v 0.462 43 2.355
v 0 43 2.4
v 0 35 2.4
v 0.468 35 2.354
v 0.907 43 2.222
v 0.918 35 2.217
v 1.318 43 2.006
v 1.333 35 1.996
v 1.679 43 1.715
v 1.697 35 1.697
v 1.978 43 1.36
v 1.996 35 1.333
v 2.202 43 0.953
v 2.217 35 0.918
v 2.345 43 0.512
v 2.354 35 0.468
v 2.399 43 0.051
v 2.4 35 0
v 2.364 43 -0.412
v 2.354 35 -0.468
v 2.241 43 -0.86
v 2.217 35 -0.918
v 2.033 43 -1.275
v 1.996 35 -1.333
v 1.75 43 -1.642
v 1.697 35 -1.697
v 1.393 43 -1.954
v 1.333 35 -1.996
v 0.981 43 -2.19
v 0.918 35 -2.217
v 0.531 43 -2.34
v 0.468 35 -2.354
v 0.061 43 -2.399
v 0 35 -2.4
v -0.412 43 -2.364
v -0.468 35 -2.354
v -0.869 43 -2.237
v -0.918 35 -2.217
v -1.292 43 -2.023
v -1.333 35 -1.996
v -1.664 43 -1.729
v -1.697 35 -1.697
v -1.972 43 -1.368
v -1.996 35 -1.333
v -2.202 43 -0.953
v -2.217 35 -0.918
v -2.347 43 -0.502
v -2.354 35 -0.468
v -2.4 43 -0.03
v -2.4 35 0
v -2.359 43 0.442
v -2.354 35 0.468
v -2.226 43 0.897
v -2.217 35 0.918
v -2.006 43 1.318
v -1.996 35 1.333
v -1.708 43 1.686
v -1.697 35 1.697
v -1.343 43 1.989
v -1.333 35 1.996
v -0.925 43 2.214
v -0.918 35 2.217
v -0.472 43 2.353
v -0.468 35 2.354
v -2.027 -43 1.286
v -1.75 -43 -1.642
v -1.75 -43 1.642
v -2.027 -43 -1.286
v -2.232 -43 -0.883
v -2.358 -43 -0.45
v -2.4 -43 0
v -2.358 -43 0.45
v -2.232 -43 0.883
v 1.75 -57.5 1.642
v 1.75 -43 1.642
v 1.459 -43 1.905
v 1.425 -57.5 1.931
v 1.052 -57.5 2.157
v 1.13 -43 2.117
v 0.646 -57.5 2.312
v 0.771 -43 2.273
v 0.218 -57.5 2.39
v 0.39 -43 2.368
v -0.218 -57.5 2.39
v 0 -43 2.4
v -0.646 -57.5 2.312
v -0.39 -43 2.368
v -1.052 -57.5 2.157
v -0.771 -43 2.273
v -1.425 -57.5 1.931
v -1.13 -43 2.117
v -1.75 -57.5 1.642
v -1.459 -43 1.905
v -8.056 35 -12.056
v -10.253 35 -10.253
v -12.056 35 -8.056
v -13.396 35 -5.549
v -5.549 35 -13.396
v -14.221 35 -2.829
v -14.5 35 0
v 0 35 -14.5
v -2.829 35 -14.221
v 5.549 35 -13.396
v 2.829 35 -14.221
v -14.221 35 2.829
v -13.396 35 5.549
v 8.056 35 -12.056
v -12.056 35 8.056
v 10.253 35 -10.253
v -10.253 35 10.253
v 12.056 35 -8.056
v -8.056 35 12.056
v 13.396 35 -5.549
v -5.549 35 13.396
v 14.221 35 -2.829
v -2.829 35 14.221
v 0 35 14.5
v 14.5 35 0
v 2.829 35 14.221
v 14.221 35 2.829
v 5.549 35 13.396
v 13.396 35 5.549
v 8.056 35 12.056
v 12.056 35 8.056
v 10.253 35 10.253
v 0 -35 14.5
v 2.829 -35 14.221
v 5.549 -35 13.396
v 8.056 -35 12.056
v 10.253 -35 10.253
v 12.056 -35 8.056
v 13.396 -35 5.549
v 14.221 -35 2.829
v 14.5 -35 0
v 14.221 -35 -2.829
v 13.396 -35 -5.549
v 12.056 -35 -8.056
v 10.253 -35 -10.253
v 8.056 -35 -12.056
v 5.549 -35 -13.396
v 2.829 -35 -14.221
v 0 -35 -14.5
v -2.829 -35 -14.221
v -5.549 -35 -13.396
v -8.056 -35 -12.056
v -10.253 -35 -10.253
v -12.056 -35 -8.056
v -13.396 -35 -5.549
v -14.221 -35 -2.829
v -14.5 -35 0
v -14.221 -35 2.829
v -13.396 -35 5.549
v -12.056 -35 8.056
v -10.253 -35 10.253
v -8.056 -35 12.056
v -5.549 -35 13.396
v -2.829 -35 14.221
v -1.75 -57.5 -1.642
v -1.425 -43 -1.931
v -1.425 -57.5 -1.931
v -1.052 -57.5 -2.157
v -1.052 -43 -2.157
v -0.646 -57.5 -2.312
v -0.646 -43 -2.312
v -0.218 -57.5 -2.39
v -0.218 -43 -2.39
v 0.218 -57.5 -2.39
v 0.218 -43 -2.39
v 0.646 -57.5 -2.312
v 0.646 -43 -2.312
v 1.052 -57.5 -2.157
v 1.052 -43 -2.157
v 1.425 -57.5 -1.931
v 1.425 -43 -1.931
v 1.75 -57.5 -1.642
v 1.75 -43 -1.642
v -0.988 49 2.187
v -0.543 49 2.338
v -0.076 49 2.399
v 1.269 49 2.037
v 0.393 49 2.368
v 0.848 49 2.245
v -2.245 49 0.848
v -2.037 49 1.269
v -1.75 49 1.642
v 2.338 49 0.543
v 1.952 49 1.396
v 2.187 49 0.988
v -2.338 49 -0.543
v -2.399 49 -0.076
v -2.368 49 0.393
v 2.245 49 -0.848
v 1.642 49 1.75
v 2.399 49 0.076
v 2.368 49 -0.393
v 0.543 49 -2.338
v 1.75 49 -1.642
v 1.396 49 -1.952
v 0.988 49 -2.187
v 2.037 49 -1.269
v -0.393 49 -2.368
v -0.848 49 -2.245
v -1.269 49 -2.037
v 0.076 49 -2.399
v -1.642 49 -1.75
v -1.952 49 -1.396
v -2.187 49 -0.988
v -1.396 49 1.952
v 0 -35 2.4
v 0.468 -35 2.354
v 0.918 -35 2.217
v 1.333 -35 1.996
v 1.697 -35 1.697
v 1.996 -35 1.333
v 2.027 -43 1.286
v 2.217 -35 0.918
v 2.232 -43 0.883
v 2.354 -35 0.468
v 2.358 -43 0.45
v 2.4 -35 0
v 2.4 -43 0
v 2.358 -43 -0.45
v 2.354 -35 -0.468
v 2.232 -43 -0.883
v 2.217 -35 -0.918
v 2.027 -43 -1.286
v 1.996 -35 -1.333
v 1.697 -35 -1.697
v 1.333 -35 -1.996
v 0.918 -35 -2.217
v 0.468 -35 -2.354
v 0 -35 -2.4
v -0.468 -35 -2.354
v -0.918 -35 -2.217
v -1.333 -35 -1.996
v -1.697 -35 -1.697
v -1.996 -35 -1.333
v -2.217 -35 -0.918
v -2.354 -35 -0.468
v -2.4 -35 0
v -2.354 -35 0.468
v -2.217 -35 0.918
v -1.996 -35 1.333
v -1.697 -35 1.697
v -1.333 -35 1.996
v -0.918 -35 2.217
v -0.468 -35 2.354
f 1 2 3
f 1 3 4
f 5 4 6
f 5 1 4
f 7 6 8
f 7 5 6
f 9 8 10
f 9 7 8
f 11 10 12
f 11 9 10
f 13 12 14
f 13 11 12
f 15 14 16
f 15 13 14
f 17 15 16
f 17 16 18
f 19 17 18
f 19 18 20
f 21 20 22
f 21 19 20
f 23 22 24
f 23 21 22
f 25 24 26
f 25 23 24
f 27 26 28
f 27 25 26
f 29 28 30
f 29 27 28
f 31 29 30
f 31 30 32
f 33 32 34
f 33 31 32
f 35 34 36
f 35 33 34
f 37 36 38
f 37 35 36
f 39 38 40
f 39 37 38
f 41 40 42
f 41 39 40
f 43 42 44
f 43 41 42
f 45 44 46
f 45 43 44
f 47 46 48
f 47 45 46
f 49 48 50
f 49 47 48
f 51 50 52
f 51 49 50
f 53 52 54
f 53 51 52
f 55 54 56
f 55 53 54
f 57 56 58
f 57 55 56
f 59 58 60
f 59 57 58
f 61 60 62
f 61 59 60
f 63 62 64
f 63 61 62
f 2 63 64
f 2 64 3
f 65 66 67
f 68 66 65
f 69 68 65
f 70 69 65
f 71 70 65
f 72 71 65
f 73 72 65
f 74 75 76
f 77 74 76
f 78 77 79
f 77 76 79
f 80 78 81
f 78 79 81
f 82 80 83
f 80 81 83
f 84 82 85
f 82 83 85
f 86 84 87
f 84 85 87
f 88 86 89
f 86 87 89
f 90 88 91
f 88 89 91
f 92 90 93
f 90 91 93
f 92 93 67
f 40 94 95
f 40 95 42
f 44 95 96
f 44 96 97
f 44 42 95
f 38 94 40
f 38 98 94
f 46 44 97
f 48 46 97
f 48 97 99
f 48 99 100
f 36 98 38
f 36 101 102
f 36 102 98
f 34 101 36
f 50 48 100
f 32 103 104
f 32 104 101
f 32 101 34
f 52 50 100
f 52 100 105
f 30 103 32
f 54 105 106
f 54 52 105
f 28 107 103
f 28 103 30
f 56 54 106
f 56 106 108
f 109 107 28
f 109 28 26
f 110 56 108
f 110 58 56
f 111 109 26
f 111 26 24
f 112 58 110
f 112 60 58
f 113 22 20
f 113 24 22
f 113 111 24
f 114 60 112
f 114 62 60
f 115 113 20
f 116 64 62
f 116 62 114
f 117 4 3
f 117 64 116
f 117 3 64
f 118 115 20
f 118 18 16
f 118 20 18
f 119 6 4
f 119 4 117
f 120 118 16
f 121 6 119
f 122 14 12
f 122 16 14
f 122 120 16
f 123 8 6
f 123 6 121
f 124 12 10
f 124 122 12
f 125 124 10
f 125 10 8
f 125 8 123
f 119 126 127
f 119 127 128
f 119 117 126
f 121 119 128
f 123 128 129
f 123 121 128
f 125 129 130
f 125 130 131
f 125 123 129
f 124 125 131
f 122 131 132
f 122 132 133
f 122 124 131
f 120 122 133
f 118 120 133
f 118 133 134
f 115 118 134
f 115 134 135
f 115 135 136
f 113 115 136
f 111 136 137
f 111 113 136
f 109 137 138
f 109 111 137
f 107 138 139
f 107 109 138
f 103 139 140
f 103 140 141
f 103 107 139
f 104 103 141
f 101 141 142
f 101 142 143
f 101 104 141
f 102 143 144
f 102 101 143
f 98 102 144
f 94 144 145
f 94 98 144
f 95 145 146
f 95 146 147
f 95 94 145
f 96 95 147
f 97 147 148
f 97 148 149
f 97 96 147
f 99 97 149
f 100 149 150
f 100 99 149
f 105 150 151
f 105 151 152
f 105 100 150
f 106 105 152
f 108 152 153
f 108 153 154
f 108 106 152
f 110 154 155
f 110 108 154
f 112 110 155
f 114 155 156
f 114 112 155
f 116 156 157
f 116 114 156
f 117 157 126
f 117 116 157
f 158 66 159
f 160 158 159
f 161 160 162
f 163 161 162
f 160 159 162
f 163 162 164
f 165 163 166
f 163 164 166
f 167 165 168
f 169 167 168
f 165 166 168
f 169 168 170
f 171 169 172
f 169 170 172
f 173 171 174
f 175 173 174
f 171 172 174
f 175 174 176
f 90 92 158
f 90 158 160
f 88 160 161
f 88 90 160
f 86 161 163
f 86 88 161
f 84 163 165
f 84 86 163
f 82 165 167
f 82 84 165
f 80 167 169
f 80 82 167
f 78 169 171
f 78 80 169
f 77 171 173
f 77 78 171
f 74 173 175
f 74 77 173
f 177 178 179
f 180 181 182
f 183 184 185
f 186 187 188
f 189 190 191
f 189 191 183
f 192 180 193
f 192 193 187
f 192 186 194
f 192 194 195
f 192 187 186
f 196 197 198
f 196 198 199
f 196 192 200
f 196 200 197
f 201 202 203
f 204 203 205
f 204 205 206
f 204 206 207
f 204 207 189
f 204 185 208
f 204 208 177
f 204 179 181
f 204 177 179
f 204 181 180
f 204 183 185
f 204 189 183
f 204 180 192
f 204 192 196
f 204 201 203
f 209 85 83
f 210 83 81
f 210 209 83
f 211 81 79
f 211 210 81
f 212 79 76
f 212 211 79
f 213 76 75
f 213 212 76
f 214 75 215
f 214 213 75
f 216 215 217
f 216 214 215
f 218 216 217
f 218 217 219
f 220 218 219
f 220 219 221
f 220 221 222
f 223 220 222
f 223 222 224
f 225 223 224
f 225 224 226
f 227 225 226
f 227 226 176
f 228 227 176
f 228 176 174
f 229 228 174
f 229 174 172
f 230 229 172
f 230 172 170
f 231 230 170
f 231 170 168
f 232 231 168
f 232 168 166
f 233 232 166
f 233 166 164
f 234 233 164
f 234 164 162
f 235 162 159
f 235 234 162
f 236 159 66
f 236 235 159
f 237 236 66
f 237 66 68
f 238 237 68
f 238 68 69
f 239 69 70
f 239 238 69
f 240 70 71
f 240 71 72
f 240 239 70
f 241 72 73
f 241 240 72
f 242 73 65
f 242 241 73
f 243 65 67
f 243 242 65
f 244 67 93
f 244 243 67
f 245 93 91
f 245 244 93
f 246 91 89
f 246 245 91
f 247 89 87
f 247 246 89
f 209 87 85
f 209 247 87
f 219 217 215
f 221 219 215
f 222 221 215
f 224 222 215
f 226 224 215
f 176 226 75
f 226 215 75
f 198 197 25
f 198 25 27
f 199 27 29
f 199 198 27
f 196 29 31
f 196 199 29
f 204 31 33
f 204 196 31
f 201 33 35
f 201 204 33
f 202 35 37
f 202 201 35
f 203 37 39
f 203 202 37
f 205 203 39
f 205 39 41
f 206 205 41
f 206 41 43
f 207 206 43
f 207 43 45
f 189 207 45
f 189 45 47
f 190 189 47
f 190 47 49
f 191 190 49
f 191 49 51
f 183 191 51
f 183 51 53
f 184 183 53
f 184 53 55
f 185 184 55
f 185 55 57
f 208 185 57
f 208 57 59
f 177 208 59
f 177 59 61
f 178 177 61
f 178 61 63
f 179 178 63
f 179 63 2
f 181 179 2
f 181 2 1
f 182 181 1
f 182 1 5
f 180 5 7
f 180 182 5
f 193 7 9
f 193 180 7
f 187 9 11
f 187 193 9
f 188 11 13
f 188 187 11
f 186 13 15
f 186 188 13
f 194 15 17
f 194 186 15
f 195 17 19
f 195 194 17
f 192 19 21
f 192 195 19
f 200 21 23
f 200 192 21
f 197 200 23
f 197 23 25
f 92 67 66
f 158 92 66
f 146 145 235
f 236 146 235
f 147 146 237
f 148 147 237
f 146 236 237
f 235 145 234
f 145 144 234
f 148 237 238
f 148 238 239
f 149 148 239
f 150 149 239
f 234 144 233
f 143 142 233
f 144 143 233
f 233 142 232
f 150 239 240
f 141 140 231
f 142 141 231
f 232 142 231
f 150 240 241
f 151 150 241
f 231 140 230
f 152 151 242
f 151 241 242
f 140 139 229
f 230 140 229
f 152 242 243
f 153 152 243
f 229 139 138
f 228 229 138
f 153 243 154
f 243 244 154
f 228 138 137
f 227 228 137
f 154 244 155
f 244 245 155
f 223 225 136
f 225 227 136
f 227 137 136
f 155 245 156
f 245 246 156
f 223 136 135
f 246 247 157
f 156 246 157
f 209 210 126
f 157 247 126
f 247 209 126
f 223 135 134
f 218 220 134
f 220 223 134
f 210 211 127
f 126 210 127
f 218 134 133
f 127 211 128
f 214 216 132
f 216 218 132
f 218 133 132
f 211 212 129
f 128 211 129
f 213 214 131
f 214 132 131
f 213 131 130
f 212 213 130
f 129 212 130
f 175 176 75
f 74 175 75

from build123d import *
from build123d.topology import SkipClean

# Parameters (mm, degrees)
CROQUIS1_R              = 14.5
SALIENTE_EXTRUIR1_DEPTH = 35
CROQUIS2_R              = 2.4
SALIENTE_EXTRUIR2_DEPTH = 43
SALIENTE_EXTRUIR3_DEPTH = 14.5
SALIENTE_EXTRUIR4_START = 6
CROQUIS4_R              = 2.4
SALIENTE_EXTRUIR4_DEPTH = 6


with BuildPart() as part:
    # Croquis1 → Saliente-Extruir1 (new, symmetric)
    with BuildSketch(Plane(origin=(0, 0, 0), x_dir=(1, 0, 0), z_dir=(0, 1, 0))):
        with Locations(Location((0, 0, 0), (0, 0, 270))):
            Circle(CROQUIS1_R)
    extrude(amount=SALIENTE_EXTRUIR1_DEPTH, both=True)

    # Croquis2 → Saliente-Extruir2 (add, symmetric)
    with BuildSketch(Plane(origin=(0, 0, 0), x_dir=(1, 0, 0), z_dir=(0, 1, 0))):
        with Locations(Location((0, 0, 0), (0, 0, 270))):
            Circle(CROQUIS2_R)
    extrude(amount=SALIENTE_EXTRUIR2_DEPTH, both=True)

    # Croquis3 → Saliente-Extruir3 (add)
    with SkipClean():  # the faces are left unmerged after this step: merging them gives an invalid solid
        with BuildSketch(Plane.XZ.offset(43)):
            with BuildLine():
                Line((-1.75, 1.642406771), (-1.75, -1.642406771))
                ThreePointArc((-1.75, -1.642406771), (0, -2.4), (1.75, -1.642406771))
                Line((1.75, -1.642406771), (1.75, 1.642406771))
                ThreePointArc((1.75, 1.642406771), (0, 2.4), (-1.75, 1.642406771))
            make_face()
        extrude(amount=SALIENTE_EXTRUIR3_DEPTH)

    # Croquis4 → Saliente-Extruir4 (add)
    with SkipClean():  # the faces are left unmerged after this step: merging them gives an invalid solid
        with BuildSketch(Plane(origin=(0, 43, 0), x_dir=(1, 0, 0), z_dir=(0, 1, 0)).offset(SALIENTE_EXTRUIR4_START)):
            with Locations(Location((0, 0, 0), (0, 0, 43.183421796))):
                Circle(CROQUIS4_R)
        extrude(amount=-SALIENTE_EXTRUIR4_DEPTH)


solid = part.part
